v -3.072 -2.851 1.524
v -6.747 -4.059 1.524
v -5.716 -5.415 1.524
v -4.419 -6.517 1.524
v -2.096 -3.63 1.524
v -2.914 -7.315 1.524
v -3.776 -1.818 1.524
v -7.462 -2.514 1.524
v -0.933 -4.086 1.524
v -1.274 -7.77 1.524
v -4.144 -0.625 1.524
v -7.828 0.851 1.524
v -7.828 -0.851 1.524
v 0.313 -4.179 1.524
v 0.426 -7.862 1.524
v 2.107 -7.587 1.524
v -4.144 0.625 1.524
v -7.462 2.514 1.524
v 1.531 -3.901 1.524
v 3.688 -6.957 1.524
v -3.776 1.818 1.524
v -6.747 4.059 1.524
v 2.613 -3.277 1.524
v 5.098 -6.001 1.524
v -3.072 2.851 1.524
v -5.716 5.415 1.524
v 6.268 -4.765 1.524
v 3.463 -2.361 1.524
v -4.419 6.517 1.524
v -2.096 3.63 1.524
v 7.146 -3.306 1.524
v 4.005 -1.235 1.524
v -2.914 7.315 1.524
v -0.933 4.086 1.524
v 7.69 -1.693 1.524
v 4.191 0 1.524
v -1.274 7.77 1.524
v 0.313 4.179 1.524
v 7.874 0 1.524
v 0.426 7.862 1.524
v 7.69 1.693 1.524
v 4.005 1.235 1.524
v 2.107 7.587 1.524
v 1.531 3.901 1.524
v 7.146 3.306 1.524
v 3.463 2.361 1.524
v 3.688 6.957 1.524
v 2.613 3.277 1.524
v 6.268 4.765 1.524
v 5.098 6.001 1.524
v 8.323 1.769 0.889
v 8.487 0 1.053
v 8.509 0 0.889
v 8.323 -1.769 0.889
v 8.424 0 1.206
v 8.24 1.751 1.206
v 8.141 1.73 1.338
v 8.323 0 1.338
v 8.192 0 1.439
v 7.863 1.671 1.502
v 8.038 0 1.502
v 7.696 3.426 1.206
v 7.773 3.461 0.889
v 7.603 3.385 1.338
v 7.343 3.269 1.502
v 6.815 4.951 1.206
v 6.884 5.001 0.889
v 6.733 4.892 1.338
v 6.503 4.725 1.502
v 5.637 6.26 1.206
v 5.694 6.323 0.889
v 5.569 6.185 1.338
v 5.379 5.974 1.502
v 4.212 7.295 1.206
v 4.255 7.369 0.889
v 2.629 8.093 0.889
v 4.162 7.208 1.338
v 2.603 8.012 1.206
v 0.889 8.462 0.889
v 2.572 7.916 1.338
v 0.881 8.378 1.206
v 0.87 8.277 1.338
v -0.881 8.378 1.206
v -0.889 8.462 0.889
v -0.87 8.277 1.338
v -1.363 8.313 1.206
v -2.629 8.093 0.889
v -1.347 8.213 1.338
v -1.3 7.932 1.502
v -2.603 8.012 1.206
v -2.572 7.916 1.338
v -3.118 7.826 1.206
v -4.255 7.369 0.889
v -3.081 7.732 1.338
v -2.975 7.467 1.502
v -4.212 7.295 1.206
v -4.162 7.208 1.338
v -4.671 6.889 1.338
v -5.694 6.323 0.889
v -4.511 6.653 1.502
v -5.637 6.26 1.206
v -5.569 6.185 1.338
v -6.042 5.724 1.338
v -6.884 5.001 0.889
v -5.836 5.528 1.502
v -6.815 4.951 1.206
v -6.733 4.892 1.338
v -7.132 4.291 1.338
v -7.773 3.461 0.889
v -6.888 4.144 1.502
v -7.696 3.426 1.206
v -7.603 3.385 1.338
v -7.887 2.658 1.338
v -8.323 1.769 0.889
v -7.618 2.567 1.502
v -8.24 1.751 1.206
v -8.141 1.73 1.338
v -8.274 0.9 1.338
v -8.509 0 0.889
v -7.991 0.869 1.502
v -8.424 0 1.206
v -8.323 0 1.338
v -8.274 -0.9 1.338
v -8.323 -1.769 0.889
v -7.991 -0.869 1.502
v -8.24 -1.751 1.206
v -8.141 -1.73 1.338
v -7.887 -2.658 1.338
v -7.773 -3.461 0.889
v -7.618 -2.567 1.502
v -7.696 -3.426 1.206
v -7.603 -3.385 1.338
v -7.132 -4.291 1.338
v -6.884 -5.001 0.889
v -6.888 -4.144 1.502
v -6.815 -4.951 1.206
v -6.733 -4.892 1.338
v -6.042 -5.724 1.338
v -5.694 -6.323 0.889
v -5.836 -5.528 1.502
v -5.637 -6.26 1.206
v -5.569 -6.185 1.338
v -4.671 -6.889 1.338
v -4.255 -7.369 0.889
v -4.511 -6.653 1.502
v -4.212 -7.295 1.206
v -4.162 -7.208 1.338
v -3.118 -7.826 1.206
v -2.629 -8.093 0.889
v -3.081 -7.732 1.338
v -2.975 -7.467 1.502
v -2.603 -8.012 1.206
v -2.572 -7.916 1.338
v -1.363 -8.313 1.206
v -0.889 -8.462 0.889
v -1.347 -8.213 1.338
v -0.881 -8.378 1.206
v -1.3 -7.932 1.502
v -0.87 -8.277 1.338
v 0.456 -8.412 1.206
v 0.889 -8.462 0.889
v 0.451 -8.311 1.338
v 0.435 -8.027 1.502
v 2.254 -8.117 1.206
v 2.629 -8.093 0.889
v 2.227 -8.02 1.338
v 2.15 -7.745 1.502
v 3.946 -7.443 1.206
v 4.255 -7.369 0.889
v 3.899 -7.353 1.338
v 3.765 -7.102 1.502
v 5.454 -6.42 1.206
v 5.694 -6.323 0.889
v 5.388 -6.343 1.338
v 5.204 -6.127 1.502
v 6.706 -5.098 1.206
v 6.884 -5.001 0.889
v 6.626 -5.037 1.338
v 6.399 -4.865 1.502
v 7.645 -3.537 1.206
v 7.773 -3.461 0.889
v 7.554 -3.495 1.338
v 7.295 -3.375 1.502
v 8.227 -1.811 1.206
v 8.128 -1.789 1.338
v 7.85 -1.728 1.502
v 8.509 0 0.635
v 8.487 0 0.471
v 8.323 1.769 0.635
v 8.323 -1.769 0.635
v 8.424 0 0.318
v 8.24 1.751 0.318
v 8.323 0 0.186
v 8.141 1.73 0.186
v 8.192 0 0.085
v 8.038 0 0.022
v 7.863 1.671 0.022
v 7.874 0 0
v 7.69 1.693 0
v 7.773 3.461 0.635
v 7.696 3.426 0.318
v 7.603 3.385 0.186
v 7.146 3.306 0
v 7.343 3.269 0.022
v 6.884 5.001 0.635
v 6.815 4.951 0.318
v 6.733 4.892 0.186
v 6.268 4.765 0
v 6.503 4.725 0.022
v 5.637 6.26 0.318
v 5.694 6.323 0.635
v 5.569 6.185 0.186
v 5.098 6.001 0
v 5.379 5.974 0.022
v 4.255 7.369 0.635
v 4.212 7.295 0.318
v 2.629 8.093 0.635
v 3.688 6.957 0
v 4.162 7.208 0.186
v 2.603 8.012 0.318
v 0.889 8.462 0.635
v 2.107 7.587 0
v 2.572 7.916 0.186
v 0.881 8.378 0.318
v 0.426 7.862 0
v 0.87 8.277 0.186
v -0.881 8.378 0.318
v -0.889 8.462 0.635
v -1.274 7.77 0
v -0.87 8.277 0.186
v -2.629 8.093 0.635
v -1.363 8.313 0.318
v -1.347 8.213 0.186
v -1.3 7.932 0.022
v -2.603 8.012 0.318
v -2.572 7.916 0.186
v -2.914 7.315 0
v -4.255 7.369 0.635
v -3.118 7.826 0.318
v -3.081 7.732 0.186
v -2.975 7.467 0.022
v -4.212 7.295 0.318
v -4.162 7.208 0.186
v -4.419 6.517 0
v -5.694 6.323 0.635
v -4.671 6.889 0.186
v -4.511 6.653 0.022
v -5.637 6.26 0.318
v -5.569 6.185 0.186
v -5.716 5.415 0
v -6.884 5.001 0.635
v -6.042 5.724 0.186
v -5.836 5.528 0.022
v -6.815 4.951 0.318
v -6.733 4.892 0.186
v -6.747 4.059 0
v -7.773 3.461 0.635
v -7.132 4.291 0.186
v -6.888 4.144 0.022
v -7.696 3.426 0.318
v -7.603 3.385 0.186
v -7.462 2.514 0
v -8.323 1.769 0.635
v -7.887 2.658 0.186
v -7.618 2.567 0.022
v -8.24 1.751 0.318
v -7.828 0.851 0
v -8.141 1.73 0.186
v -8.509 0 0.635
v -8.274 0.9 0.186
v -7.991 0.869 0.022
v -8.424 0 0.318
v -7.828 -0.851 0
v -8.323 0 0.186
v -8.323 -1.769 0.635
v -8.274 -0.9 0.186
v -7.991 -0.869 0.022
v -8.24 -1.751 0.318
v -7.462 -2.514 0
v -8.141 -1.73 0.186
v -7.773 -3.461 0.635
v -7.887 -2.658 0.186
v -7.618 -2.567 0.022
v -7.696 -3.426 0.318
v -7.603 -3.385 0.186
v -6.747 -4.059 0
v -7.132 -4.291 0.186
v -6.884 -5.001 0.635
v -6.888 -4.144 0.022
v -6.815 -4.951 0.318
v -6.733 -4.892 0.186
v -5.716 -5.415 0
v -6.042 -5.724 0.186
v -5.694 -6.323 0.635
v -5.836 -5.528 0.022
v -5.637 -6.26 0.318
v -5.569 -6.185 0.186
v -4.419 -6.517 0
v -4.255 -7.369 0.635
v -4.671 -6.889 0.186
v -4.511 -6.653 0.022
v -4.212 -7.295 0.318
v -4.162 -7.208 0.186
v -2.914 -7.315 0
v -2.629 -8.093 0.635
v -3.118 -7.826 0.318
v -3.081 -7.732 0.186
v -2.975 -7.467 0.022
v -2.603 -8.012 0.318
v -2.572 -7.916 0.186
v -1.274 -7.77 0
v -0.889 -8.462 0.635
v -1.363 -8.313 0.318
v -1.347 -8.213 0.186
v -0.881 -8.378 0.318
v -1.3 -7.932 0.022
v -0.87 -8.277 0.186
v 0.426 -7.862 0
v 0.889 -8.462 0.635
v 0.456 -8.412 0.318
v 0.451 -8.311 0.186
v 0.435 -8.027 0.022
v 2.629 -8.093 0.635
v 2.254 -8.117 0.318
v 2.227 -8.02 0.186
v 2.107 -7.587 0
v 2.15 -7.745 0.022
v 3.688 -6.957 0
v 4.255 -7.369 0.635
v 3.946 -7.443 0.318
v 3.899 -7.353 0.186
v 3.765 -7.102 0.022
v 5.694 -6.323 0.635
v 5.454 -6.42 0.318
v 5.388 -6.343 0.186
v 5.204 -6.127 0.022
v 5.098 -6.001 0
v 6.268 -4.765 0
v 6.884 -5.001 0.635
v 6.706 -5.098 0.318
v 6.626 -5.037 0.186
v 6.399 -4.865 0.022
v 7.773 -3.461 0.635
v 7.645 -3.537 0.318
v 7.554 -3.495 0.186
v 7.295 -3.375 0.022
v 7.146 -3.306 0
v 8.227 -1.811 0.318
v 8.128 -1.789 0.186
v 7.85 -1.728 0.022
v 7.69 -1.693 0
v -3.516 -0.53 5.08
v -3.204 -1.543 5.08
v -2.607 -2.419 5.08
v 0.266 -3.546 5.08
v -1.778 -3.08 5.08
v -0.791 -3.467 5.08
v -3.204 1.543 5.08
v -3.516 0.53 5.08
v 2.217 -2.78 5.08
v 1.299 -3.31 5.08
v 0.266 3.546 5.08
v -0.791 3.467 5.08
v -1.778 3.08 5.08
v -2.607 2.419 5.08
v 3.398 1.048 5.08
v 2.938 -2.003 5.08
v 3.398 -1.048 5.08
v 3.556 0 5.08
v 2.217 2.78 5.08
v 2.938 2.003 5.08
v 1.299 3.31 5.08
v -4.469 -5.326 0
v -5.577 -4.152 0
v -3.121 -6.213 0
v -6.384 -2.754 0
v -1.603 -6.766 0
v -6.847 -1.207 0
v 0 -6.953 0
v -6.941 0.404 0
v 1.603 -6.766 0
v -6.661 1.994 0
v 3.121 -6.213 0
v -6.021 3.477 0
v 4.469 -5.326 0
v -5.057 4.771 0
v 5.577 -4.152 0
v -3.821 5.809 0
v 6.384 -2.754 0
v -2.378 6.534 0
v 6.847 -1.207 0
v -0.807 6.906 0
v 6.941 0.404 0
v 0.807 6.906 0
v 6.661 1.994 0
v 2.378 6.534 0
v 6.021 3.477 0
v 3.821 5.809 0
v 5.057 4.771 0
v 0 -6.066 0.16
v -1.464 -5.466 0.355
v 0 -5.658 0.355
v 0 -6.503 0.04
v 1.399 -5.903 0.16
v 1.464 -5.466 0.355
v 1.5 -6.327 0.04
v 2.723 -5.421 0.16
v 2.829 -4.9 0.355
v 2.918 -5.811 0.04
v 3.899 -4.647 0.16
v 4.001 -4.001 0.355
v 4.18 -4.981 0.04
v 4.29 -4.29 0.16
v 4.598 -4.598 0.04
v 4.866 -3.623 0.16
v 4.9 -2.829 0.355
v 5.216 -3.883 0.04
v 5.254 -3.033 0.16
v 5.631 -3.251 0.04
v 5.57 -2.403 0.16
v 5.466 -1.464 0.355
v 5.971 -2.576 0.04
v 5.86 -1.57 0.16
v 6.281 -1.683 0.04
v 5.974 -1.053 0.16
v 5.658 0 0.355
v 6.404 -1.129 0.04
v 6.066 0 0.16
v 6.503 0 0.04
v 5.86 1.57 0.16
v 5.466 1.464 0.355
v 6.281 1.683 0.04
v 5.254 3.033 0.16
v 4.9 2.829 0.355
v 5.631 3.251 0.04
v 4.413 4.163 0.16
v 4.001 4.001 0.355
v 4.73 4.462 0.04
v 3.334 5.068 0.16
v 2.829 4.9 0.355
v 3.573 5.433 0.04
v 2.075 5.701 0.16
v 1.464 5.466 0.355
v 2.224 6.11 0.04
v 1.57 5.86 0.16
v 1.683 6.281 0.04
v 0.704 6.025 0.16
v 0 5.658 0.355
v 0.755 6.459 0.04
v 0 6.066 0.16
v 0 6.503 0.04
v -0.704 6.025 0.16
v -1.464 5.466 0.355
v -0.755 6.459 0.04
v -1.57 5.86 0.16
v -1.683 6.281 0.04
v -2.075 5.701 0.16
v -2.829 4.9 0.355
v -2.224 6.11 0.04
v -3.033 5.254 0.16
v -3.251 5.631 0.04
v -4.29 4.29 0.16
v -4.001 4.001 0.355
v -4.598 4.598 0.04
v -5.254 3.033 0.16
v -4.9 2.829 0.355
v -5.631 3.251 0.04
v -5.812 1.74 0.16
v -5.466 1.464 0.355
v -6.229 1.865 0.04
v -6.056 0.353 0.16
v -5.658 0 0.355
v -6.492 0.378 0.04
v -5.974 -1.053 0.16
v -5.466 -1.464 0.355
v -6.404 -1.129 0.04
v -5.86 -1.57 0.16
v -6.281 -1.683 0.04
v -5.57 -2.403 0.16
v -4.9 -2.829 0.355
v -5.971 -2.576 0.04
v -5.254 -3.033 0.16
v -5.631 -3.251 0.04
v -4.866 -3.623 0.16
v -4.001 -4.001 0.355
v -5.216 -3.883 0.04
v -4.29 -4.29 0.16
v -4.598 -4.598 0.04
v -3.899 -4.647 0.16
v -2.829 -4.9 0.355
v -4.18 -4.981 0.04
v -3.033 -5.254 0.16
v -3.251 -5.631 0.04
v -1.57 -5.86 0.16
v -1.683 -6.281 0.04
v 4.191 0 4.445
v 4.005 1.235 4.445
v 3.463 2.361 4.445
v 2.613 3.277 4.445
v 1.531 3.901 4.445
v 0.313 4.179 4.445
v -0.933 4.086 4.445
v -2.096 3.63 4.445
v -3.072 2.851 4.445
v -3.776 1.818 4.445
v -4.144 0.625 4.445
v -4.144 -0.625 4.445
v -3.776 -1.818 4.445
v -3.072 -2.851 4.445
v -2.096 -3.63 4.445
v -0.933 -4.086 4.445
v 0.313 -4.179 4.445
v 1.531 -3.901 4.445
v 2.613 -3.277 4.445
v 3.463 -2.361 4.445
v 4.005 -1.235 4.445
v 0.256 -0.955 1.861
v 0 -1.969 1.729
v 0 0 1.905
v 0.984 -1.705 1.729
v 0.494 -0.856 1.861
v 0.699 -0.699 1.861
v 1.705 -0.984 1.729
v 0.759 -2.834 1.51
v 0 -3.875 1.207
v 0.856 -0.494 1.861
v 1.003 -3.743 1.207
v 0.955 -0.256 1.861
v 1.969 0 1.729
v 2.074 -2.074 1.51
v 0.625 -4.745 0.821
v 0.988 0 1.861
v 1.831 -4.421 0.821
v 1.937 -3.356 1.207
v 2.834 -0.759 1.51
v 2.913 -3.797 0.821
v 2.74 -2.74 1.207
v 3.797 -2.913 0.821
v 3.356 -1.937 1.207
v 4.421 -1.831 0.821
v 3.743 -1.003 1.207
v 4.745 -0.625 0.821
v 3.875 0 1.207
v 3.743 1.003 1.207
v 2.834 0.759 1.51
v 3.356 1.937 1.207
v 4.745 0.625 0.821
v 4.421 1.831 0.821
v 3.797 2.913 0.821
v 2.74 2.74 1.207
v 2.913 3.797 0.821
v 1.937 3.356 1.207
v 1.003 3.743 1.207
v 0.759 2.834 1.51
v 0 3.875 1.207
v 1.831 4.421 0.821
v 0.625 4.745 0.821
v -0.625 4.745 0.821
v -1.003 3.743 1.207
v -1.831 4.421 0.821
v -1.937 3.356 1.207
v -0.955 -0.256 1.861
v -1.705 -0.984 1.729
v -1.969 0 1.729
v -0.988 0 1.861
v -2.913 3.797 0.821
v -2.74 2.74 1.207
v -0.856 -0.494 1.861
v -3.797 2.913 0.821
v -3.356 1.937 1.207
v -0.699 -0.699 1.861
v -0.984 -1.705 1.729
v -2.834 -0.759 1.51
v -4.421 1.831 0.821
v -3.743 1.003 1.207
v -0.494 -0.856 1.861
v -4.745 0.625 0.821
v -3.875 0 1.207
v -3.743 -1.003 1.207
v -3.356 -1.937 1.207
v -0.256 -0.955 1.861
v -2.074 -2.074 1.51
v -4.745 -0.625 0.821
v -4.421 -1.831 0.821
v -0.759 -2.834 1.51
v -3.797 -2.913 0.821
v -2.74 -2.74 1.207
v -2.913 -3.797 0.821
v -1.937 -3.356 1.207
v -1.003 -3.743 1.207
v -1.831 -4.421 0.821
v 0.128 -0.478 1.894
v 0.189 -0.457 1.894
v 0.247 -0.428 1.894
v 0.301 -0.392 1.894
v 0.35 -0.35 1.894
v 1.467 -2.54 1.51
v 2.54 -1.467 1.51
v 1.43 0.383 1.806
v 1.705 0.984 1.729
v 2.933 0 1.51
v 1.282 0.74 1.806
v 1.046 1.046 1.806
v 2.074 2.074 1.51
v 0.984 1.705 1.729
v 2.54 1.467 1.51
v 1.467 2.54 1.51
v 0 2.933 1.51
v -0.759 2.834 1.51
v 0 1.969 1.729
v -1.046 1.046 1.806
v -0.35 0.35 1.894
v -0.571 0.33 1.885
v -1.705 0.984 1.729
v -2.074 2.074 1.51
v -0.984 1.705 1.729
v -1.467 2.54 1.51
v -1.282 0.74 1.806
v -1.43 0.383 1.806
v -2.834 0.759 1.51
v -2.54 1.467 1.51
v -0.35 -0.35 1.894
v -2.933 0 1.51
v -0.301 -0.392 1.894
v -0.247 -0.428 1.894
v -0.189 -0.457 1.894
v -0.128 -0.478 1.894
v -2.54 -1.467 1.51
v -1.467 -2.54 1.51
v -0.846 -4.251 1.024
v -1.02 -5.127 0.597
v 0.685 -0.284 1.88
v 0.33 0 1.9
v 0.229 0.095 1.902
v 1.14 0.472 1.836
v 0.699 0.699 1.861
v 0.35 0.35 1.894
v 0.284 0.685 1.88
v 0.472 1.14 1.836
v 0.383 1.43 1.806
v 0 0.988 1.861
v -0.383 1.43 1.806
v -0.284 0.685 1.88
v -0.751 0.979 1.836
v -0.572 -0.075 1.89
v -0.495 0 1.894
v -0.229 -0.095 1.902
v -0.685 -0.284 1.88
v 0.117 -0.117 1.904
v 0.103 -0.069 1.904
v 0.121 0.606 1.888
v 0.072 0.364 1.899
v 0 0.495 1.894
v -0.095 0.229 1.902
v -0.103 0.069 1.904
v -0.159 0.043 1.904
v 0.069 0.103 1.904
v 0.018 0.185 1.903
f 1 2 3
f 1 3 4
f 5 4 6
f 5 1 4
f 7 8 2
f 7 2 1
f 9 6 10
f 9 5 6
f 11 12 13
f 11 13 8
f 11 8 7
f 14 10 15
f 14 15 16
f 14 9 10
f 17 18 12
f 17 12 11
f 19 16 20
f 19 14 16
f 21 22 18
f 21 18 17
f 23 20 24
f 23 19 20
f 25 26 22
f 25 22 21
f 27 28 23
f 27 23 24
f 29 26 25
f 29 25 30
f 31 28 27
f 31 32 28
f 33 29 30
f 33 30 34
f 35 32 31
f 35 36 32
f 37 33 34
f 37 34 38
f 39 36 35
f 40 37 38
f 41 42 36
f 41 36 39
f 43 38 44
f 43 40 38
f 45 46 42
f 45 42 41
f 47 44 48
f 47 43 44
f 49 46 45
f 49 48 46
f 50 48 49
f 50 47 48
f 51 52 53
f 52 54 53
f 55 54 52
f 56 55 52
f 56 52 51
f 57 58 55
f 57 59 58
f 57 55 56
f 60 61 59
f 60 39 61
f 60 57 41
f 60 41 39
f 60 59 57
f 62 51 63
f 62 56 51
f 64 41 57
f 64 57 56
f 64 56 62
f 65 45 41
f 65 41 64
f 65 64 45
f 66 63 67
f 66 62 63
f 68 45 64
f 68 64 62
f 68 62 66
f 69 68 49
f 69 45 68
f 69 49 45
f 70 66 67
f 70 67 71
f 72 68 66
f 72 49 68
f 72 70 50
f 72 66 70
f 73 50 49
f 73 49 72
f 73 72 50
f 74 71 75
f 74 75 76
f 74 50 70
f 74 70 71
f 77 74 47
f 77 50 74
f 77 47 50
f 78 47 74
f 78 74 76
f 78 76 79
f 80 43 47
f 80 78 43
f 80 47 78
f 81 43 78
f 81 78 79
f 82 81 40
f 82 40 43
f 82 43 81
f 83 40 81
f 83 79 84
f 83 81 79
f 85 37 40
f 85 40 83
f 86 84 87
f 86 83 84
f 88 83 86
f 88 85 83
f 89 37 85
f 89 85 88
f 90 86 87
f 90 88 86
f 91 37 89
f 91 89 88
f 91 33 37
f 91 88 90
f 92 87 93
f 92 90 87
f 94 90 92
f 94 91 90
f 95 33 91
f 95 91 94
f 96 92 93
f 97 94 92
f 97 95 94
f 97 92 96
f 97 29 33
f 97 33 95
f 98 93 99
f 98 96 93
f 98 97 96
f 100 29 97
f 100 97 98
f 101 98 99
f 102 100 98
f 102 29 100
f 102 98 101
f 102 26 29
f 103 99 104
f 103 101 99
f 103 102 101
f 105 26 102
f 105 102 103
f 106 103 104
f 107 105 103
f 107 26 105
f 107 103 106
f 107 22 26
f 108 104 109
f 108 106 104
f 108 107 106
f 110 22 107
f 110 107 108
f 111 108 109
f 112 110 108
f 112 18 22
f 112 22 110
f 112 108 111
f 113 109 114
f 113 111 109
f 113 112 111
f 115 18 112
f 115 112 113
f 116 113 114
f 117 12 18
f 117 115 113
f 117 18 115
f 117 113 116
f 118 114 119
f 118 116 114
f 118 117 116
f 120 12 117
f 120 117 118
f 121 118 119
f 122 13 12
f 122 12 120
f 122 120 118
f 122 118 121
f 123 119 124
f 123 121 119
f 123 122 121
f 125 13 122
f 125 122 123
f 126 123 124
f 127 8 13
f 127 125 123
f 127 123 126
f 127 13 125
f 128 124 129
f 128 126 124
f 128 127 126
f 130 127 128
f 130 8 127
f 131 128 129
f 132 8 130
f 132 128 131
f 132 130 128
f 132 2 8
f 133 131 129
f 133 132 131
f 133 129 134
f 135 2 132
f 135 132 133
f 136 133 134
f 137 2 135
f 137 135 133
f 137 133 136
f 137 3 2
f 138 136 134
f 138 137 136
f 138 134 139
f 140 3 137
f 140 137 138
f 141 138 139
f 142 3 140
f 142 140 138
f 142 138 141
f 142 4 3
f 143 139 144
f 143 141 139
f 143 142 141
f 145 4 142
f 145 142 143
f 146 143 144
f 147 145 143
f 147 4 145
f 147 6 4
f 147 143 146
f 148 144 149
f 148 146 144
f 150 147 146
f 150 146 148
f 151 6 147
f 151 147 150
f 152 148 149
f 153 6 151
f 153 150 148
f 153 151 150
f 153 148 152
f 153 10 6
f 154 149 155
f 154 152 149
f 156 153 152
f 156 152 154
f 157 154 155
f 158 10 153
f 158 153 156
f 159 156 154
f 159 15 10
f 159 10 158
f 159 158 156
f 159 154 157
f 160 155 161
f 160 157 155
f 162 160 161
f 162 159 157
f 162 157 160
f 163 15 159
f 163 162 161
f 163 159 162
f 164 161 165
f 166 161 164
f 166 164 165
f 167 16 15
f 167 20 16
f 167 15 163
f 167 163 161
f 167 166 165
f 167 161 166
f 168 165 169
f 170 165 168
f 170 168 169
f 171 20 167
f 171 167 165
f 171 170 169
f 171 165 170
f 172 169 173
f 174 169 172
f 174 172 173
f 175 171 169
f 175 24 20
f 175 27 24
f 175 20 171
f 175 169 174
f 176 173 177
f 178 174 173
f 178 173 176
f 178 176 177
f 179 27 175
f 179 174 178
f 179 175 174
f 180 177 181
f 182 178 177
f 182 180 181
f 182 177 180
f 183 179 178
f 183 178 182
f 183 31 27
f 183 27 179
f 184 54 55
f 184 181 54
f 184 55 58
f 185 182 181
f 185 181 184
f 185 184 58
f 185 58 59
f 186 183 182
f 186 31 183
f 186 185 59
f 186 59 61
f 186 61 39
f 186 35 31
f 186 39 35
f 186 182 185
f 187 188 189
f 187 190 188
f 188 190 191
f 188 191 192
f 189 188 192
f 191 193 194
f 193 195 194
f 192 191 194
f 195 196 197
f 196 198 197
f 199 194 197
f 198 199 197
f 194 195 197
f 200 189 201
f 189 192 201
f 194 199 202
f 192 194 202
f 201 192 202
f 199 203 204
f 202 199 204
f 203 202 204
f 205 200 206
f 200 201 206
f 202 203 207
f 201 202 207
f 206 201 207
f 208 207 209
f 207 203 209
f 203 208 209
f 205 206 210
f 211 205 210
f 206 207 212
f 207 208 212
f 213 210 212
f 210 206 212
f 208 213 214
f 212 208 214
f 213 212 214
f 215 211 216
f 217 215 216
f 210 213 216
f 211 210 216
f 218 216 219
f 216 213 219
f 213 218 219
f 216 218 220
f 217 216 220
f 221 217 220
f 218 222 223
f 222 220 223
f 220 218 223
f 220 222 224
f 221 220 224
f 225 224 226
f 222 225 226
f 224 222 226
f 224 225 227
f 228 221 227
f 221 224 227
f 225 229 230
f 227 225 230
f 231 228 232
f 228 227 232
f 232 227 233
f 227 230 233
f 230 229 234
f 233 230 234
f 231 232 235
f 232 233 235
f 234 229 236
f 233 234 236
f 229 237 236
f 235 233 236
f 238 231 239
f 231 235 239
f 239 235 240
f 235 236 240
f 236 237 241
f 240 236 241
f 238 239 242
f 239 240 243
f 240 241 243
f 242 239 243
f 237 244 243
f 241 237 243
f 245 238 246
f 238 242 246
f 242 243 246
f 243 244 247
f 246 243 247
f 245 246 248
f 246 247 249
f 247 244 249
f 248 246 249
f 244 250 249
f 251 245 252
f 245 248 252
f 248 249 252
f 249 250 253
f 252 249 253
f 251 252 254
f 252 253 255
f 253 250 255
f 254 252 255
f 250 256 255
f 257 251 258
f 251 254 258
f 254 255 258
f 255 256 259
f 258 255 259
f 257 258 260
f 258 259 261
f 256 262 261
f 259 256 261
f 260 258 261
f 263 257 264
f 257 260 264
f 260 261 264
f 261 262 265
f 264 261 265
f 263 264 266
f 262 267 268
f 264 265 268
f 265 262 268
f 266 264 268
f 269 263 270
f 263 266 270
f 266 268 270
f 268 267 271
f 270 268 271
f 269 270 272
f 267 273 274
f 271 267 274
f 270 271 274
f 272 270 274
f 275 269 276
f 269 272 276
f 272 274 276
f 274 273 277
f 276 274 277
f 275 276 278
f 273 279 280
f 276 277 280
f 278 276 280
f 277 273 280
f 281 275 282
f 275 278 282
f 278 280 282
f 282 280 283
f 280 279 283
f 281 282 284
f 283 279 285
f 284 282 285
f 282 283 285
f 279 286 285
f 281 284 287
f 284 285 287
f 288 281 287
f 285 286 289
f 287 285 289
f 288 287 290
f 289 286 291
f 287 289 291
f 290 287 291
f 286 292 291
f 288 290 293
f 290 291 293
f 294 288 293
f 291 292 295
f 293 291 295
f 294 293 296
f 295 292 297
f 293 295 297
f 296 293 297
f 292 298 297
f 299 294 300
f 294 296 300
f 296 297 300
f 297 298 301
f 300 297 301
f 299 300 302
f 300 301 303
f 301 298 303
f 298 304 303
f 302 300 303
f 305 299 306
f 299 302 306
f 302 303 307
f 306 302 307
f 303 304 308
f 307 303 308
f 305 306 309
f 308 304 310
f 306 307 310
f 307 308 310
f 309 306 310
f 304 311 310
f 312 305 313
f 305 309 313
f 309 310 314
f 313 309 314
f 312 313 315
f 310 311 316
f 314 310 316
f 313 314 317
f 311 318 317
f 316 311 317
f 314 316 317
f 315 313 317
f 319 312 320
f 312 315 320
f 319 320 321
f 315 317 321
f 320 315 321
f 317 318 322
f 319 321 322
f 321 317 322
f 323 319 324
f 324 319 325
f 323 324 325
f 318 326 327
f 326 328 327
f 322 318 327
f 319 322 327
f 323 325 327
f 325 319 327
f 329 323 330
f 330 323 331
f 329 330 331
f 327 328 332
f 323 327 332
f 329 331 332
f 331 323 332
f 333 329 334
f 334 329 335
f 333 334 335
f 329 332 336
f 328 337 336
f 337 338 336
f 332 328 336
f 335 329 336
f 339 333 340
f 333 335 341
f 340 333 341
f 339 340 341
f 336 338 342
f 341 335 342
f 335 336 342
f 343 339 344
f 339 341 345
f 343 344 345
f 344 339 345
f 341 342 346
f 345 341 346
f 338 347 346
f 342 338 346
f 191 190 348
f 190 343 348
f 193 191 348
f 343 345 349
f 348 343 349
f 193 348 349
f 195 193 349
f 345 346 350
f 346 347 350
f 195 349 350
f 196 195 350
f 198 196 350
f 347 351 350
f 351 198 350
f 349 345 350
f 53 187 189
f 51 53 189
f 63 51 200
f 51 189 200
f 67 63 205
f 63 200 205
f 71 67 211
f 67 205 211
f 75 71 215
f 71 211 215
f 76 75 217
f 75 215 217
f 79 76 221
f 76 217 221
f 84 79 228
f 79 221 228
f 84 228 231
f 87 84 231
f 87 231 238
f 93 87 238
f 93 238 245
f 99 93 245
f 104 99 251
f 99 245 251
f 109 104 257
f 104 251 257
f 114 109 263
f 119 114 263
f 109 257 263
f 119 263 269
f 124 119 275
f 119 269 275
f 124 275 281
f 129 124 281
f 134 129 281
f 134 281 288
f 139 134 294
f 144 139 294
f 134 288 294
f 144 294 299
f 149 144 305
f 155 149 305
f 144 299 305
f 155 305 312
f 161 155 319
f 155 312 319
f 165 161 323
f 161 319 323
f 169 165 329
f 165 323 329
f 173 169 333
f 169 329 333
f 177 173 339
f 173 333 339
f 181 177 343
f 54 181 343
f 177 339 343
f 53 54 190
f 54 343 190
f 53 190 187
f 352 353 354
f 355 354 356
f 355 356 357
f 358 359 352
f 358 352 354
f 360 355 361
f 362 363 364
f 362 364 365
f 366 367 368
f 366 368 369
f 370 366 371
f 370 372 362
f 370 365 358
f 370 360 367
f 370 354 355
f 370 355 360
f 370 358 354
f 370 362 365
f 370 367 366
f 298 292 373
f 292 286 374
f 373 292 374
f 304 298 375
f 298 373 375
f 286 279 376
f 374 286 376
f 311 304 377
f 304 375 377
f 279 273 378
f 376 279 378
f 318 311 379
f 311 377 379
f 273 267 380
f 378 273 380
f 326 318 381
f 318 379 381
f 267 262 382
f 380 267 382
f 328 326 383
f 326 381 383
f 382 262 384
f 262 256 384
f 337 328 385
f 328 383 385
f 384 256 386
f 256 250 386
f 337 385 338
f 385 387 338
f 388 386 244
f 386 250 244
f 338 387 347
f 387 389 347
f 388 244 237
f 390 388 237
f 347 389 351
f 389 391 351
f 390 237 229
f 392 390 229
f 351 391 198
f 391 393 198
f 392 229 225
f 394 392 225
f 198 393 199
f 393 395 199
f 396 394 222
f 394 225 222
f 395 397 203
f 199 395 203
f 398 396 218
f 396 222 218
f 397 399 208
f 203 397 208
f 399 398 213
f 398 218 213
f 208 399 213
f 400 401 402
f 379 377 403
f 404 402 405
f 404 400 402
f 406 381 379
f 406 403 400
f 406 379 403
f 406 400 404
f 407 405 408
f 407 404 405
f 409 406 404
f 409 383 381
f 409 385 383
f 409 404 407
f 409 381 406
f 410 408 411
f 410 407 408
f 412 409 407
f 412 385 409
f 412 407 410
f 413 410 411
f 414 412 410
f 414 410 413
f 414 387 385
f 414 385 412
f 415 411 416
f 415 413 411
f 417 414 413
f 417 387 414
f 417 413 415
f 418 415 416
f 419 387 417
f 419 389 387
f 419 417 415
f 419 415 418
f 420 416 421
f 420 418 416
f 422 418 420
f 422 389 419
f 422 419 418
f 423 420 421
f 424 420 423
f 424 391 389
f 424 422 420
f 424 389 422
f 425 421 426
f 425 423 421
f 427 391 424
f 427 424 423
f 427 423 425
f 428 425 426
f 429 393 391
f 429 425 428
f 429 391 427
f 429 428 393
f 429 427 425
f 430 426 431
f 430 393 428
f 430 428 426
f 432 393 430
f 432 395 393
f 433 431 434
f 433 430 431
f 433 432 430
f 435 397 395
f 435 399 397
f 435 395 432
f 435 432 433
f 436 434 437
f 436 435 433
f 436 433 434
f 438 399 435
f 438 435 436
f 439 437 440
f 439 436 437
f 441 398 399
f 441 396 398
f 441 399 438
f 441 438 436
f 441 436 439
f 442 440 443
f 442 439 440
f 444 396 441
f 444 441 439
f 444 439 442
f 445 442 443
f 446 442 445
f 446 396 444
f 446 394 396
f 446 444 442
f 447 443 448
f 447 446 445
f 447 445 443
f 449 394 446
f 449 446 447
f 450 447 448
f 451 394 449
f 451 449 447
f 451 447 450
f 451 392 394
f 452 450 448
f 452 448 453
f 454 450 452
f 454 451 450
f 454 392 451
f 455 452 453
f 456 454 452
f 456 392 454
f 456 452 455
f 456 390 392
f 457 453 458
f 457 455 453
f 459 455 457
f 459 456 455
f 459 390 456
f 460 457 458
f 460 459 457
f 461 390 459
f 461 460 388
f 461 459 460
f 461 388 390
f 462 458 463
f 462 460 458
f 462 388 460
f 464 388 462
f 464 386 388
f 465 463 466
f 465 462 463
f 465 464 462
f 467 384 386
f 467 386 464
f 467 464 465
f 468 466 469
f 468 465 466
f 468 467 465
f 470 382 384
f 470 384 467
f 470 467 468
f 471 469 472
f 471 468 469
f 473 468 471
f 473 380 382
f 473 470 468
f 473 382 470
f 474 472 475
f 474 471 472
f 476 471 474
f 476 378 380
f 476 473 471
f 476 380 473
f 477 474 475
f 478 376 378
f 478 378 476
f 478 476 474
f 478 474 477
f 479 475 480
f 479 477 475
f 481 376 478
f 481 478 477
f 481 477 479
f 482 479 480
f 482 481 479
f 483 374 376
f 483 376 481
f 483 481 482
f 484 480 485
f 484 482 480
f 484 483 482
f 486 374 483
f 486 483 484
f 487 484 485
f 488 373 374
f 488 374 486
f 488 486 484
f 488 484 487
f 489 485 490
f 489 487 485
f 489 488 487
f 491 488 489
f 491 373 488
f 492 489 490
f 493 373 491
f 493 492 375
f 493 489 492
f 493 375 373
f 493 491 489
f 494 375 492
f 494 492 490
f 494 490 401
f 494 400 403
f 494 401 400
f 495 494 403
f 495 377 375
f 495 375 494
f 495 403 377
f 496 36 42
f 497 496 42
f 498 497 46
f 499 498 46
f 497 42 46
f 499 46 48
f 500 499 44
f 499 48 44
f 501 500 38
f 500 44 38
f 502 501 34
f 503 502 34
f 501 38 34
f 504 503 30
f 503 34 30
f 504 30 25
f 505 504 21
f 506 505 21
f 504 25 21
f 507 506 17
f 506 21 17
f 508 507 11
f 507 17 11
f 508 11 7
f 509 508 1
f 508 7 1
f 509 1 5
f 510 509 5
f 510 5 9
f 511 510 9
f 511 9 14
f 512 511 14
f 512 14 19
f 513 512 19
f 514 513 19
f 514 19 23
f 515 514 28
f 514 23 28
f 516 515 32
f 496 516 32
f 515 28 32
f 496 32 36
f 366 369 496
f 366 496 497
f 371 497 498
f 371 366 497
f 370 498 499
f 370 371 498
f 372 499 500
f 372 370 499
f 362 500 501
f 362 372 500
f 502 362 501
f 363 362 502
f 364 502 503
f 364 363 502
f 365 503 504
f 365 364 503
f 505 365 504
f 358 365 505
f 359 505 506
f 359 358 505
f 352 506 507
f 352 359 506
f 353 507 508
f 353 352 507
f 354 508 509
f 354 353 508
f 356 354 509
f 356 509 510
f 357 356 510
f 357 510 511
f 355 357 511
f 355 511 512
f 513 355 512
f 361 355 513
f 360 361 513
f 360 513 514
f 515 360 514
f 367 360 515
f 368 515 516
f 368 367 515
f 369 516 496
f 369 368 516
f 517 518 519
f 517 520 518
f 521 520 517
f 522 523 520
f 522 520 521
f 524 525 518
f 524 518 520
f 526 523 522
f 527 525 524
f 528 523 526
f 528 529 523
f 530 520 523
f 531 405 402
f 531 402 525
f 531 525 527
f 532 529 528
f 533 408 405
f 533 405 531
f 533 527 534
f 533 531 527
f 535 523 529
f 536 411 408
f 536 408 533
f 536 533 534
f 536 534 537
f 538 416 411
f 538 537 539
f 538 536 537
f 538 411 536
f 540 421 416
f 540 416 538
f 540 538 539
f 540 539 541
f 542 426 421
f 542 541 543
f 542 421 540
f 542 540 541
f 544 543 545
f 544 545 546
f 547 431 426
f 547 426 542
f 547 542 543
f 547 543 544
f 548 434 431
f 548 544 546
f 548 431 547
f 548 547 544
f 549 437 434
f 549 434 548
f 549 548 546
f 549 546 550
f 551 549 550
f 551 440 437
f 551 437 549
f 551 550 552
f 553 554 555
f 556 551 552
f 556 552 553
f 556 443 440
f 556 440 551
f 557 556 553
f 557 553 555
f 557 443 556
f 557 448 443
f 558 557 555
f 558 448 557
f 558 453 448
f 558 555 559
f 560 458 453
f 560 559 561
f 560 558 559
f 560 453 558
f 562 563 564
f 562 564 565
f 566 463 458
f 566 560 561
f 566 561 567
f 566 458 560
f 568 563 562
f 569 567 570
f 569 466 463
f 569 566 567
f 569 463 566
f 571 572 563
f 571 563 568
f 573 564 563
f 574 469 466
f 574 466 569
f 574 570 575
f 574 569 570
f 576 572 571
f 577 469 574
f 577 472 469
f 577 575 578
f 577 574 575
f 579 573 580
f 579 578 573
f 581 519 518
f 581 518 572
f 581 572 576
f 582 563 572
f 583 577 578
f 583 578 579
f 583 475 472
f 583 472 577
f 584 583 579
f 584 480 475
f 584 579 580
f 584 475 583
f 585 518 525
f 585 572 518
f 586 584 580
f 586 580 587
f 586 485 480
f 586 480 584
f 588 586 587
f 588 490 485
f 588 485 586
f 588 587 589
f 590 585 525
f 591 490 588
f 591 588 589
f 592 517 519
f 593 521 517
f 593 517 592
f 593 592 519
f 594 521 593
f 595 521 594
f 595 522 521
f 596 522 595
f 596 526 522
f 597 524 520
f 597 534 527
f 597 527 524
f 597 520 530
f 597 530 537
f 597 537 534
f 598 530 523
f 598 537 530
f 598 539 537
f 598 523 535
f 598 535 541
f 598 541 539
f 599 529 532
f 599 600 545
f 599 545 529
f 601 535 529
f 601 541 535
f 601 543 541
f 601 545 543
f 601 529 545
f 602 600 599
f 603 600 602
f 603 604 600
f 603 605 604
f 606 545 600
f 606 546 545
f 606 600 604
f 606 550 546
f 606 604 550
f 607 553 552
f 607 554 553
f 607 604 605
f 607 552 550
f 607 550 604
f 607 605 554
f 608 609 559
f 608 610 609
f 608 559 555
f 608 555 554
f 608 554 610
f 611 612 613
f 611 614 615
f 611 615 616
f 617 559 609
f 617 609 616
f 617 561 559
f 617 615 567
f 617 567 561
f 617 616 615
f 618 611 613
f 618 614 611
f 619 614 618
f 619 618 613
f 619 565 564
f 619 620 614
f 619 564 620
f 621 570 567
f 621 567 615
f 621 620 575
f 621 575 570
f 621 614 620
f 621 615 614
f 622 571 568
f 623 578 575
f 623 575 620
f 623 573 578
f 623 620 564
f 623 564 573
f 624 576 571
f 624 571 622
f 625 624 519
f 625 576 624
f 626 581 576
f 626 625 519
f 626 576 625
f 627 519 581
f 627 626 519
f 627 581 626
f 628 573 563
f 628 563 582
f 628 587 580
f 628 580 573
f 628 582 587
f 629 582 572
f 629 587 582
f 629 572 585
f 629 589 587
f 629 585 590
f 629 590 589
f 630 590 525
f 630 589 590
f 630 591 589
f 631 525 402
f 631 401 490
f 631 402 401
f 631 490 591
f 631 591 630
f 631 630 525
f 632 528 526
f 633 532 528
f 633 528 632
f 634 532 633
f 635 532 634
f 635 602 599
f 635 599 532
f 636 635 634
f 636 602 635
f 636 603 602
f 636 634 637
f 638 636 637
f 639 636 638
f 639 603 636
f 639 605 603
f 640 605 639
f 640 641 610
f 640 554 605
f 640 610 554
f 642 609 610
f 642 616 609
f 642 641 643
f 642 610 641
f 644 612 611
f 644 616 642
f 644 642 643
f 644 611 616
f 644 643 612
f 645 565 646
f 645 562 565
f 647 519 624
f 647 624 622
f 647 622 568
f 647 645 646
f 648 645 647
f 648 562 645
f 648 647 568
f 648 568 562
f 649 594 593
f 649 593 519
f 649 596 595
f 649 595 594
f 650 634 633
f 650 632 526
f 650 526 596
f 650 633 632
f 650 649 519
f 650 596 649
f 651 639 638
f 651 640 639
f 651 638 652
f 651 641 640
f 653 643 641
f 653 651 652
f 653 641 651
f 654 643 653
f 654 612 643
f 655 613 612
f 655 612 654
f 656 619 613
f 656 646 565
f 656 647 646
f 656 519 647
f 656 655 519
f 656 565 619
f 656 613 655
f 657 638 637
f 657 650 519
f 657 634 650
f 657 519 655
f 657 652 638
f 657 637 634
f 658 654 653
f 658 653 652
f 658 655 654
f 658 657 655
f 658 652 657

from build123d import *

# Parameters (mm, degrees)
F0_R     = 8.509
F1_DEPTH = 1.524
F2_R     = 4.191
F3_DEPTH = 3.556
F4_R     = 0.635
F5_SIZE  = 0.635


with BuildPart() as f1:
    # F0 (on Top) → F1 (new body)
    with BuildSketch(Plane.XY):
        Circle(F0_R)
    extrude(amount=F1_DEPTH)

    # F2 (on face) → F3 (join)
    with BuildSketch(Plane.XY.offset(1.524)):
        Circle(F2_R)
    extrude(amount=F3_DEPTH)

    # F4
    f4_edges = [f1.edges().sort_by_distance(p)[0] for p in [
        (-8.509, 0, 1.524),
        (8.509, 0, 0.762),
        (-8.509, 0, 0),
    ]]
    fillet(f4_edges, radius=F4_R)

    # F5
    f5_edges = [f1.edges().sort_by_distance(p)[0] for p in [
        (-4.191, 0, 5.08),
    ]]
    chamfer(f5_edges, length=F5_SIZE)

    # F6 (on Right) → F7 (revolve, cut)
    with BuildSketch(Plane.YZ):
        with BuildLine():
            Line((0, 0), (0, 1.905))
            ThreePointArc((0, 1.905), (-2.933456, 1.510415), (-5.658379, 0.354708))
            ThreePointArc((-5.658379, 0.354708), (-6.281844, 0.090282), (-6.953022, 0))
            Line((-6.953022, 0), (0, 0))
        make_face()
    revolve(axis=Axis((0, 0, 0.9525), (0, 0, 1)), mode=Mode.SUBTRACT)


solid = f1.part
